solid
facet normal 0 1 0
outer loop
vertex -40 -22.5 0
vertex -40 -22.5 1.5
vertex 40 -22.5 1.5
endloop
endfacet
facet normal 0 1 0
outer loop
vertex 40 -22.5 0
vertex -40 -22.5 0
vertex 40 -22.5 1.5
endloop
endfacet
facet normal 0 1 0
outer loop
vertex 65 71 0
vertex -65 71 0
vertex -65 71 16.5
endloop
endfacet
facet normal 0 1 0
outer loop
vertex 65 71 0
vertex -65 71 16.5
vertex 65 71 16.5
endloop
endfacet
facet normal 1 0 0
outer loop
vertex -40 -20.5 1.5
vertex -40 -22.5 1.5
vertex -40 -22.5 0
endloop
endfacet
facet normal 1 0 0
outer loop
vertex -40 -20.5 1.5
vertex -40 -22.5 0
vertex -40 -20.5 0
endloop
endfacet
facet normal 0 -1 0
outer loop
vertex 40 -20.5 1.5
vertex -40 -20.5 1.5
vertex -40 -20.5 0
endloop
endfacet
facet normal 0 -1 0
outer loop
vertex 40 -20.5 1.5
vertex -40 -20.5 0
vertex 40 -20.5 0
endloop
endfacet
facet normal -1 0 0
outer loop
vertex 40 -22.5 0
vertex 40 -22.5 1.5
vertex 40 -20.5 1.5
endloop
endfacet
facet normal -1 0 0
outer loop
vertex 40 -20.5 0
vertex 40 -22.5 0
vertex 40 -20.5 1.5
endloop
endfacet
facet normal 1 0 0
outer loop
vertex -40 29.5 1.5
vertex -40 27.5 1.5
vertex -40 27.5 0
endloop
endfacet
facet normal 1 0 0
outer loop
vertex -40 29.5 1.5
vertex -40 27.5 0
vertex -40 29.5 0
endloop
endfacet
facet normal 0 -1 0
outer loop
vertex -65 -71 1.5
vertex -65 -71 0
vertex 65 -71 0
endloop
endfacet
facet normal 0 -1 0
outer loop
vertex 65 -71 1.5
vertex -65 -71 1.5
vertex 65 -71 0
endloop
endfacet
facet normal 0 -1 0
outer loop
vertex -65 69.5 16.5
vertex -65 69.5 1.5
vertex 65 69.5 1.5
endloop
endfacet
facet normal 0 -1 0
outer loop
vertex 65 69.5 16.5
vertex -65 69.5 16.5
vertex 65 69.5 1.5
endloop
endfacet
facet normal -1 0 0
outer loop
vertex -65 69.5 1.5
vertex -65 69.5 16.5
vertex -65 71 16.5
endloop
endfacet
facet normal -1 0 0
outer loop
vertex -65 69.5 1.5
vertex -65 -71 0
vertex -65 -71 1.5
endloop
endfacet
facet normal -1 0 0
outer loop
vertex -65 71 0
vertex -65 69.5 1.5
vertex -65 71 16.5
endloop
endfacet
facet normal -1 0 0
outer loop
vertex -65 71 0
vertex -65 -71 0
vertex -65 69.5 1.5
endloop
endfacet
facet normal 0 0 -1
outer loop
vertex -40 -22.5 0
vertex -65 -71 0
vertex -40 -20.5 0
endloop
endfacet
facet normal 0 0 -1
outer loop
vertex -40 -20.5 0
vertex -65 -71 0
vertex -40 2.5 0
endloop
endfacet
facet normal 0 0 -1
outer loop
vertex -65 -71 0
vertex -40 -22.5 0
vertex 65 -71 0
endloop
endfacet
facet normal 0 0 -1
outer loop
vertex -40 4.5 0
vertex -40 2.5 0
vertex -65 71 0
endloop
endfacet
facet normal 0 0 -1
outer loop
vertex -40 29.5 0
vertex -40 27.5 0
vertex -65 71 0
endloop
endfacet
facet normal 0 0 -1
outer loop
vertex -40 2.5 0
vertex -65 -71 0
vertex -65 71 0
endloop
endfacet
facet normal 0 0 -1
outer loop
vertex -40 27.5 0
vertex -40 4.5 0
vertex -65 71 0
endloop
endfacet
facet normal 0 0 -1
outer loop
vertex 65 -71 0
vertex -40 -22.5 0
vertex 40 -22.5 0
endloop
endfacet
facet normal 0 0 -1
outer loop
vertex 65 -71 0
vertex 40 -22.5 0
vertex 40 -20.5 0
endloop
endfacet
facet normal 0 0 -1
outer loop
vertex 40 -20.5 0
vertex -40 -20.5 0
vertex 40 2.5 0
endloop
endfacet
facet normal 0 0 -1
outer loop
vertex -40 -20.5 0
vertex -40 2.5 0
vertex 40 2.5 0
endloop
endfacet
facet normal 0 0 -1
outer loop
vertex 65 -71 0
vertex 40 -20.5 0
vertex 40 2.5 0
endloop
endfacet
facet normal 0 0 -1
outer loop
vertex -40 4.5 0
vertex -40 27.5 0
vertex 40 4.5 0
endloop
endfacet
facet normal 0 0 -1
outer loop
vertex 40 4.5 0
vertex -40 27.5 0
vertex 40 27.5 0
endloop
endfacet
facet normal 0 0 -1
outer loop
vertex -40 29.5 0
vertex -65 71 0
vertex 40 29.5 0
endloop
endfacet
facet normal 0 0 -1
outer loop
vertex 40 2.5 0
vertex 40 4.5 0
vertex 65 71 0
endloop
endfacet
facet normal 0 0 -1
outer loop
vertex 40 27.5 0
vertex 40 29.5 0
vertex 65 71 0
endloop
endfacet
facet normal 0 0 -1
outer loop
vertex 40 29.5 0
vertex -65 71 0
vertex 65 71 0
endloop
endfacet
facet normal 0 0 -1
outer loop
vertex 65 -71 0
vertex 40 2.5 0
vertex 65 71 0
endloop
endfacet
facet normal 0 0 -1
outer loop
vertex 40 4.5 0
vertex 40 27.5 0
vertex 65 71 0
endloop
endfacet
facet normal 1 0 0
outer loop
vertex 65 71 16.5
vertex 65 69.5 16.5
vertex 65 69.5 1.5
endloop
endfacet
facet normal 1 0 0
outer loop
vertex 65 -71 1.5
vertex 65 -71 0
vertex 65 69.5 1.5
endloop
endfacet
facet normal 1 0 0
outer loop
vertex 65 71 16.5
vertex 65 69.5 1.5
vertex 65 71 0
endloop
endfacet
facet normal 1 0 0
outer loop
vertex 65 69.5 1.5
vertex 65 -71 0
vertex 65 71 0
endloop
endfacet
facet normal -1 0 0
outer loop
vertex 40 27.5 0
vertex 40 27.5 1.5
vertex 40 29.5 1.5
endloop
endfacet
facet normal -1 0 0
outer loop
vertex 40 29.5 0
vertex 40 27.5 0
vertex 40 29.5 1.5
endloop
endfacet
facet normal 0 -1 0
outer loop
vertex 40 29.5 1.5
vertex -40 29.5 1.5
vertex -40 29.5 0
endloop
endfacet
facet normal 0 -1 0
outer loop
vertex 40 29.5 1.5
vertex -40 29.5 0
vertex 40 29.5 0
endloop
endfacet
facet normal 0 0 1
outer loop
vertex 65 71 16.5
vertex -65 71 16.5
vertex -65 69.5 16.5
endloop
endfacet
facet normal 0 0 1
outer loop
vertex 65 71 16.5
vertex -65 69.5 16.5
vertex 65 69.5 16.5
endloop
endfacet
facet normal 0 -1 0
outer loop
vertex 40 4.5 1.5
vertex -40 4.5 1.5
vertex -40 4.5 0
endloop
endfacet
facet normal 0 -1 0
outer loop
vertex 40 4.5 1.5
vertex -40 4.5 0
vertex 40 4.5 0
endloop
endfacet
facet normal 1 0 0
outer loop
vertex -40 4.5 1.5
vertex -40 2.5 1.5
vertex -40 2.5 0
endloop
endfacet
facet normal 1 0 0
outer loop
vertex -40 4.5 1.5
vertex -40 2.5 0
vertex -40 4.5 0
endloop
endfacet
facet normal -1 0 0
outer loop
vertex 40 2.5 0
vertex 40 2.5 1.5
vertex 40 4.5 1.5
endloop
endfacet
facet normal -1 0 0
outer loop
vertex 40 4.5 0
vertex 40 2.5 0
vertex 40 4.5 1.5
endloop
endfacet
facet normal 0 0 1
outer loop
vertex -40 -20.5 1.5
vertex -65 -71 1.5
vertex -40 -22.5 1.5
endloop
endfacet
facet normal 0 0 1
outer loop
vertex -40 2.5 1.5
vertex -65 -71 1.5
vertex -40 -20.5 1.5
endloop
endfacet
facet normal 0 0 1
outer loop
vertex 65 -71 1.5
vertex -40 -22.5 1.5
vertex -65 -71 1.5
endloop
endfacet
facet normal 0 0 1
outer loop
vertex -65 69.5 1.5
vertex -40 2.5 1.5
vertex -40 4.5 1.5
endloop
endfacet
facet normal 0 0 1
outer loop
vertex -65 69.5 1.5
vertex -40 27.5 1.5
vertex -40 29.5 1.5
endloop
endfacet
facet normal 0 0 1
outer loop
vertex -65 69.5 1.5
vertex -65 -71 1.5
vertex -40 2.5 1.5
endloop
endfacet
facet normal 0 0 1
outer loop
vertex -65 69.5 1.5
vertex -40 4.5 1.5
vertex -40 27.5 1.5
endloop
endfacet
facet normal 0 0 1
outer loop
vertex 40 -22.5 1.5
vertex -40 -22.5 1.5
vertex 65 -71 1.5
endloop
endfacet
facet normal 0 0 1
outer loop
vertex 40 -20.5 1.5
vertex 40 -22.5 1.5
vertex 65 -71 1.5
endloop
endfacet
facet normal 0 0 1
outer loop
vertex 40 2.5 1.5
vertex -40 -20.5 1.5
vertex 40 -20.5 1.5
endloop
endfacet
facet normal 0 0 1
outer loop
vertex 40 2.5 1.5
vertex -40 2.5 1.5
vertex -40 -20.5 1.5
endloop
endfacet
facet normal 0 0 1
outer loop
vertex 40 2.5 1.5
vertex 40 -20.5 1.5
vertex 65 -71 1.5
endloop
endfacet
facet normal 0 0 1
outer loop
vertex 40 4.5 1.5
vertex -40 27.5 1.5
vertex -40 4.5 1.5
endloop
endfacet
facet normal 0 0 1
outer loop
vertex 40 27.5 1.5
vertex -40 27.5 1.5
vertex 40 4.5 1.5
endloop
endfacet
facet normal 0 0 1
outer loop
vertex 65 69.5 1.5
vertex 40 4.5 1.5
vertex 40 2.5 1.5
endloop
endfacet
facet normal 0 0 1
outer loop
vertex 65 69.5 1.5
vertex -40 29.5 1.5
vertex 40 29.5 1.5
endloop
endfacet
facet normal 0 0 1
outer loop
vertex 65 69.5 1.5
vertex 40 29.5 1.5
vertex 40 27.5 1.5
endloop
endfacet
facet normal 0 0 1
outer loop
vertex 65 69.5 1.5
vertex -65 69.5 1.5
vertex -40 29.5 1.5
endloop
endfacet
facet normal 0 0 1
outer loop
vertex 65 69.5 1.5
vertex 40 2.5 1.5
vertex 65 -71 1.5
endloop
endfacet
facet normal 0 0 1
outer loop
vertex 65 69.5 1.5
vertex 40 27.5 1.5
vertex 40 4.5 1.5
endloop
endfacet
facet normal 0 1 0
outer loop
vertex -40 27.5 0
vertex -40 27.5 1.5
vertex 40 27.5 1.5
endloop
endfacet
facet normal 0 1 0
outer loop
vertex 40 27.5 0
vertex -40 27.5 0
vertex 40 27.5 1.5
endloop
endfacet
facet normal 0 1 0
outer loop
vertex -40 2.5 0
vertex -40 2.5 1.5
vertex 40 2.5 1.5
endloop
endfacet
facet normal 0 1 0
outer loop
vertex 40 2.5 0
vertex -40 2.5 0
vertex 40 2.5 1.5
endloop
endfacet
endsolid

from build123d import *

# Parameters (mm, degrees)
F2_W     = 130
F2_H     = 140.5
F3_DEPTH = 1.5
F2_H_2   = 1.5
F4_DEPTH = 16.5
F5_W     = 80
F5_H     = 2
F6_DEPTH = 1.501


with BuildPart() as f3:
    # F2 (on Top) → F3 (new body)
    with BuildSketch(Plane.XY):
        with Locations((0, -0.75)):
            Rectangle(F2_W, F2_H)
    extrude(amount=F3_DEPTH)

    # F2 (on Top) → F4 (join)
    with BuildSketch(Plane.XY):
        with Locations((0, 70.25)):
            Rectangle(F2_W, F2_H_2)
    extrude(amount=F4_DEPTH)

    # F5 (on face) → F6 (cut, through all)
    with BuildSketch(Plane.XY.offset(1.5)):
        with Locations((0, 28.5)):
            Rectangle(F5_W, F5_H)
        with Locations((0, 3.5)):
            Rectangle(F5_W, F5_H)
        with Locations((0, -21.5)):
            Rectangle(F5_W, F5_H)
    extrude(amount=-F6_DEPTH, mode=Mode.SUBTRACT)


solid = f3.part
